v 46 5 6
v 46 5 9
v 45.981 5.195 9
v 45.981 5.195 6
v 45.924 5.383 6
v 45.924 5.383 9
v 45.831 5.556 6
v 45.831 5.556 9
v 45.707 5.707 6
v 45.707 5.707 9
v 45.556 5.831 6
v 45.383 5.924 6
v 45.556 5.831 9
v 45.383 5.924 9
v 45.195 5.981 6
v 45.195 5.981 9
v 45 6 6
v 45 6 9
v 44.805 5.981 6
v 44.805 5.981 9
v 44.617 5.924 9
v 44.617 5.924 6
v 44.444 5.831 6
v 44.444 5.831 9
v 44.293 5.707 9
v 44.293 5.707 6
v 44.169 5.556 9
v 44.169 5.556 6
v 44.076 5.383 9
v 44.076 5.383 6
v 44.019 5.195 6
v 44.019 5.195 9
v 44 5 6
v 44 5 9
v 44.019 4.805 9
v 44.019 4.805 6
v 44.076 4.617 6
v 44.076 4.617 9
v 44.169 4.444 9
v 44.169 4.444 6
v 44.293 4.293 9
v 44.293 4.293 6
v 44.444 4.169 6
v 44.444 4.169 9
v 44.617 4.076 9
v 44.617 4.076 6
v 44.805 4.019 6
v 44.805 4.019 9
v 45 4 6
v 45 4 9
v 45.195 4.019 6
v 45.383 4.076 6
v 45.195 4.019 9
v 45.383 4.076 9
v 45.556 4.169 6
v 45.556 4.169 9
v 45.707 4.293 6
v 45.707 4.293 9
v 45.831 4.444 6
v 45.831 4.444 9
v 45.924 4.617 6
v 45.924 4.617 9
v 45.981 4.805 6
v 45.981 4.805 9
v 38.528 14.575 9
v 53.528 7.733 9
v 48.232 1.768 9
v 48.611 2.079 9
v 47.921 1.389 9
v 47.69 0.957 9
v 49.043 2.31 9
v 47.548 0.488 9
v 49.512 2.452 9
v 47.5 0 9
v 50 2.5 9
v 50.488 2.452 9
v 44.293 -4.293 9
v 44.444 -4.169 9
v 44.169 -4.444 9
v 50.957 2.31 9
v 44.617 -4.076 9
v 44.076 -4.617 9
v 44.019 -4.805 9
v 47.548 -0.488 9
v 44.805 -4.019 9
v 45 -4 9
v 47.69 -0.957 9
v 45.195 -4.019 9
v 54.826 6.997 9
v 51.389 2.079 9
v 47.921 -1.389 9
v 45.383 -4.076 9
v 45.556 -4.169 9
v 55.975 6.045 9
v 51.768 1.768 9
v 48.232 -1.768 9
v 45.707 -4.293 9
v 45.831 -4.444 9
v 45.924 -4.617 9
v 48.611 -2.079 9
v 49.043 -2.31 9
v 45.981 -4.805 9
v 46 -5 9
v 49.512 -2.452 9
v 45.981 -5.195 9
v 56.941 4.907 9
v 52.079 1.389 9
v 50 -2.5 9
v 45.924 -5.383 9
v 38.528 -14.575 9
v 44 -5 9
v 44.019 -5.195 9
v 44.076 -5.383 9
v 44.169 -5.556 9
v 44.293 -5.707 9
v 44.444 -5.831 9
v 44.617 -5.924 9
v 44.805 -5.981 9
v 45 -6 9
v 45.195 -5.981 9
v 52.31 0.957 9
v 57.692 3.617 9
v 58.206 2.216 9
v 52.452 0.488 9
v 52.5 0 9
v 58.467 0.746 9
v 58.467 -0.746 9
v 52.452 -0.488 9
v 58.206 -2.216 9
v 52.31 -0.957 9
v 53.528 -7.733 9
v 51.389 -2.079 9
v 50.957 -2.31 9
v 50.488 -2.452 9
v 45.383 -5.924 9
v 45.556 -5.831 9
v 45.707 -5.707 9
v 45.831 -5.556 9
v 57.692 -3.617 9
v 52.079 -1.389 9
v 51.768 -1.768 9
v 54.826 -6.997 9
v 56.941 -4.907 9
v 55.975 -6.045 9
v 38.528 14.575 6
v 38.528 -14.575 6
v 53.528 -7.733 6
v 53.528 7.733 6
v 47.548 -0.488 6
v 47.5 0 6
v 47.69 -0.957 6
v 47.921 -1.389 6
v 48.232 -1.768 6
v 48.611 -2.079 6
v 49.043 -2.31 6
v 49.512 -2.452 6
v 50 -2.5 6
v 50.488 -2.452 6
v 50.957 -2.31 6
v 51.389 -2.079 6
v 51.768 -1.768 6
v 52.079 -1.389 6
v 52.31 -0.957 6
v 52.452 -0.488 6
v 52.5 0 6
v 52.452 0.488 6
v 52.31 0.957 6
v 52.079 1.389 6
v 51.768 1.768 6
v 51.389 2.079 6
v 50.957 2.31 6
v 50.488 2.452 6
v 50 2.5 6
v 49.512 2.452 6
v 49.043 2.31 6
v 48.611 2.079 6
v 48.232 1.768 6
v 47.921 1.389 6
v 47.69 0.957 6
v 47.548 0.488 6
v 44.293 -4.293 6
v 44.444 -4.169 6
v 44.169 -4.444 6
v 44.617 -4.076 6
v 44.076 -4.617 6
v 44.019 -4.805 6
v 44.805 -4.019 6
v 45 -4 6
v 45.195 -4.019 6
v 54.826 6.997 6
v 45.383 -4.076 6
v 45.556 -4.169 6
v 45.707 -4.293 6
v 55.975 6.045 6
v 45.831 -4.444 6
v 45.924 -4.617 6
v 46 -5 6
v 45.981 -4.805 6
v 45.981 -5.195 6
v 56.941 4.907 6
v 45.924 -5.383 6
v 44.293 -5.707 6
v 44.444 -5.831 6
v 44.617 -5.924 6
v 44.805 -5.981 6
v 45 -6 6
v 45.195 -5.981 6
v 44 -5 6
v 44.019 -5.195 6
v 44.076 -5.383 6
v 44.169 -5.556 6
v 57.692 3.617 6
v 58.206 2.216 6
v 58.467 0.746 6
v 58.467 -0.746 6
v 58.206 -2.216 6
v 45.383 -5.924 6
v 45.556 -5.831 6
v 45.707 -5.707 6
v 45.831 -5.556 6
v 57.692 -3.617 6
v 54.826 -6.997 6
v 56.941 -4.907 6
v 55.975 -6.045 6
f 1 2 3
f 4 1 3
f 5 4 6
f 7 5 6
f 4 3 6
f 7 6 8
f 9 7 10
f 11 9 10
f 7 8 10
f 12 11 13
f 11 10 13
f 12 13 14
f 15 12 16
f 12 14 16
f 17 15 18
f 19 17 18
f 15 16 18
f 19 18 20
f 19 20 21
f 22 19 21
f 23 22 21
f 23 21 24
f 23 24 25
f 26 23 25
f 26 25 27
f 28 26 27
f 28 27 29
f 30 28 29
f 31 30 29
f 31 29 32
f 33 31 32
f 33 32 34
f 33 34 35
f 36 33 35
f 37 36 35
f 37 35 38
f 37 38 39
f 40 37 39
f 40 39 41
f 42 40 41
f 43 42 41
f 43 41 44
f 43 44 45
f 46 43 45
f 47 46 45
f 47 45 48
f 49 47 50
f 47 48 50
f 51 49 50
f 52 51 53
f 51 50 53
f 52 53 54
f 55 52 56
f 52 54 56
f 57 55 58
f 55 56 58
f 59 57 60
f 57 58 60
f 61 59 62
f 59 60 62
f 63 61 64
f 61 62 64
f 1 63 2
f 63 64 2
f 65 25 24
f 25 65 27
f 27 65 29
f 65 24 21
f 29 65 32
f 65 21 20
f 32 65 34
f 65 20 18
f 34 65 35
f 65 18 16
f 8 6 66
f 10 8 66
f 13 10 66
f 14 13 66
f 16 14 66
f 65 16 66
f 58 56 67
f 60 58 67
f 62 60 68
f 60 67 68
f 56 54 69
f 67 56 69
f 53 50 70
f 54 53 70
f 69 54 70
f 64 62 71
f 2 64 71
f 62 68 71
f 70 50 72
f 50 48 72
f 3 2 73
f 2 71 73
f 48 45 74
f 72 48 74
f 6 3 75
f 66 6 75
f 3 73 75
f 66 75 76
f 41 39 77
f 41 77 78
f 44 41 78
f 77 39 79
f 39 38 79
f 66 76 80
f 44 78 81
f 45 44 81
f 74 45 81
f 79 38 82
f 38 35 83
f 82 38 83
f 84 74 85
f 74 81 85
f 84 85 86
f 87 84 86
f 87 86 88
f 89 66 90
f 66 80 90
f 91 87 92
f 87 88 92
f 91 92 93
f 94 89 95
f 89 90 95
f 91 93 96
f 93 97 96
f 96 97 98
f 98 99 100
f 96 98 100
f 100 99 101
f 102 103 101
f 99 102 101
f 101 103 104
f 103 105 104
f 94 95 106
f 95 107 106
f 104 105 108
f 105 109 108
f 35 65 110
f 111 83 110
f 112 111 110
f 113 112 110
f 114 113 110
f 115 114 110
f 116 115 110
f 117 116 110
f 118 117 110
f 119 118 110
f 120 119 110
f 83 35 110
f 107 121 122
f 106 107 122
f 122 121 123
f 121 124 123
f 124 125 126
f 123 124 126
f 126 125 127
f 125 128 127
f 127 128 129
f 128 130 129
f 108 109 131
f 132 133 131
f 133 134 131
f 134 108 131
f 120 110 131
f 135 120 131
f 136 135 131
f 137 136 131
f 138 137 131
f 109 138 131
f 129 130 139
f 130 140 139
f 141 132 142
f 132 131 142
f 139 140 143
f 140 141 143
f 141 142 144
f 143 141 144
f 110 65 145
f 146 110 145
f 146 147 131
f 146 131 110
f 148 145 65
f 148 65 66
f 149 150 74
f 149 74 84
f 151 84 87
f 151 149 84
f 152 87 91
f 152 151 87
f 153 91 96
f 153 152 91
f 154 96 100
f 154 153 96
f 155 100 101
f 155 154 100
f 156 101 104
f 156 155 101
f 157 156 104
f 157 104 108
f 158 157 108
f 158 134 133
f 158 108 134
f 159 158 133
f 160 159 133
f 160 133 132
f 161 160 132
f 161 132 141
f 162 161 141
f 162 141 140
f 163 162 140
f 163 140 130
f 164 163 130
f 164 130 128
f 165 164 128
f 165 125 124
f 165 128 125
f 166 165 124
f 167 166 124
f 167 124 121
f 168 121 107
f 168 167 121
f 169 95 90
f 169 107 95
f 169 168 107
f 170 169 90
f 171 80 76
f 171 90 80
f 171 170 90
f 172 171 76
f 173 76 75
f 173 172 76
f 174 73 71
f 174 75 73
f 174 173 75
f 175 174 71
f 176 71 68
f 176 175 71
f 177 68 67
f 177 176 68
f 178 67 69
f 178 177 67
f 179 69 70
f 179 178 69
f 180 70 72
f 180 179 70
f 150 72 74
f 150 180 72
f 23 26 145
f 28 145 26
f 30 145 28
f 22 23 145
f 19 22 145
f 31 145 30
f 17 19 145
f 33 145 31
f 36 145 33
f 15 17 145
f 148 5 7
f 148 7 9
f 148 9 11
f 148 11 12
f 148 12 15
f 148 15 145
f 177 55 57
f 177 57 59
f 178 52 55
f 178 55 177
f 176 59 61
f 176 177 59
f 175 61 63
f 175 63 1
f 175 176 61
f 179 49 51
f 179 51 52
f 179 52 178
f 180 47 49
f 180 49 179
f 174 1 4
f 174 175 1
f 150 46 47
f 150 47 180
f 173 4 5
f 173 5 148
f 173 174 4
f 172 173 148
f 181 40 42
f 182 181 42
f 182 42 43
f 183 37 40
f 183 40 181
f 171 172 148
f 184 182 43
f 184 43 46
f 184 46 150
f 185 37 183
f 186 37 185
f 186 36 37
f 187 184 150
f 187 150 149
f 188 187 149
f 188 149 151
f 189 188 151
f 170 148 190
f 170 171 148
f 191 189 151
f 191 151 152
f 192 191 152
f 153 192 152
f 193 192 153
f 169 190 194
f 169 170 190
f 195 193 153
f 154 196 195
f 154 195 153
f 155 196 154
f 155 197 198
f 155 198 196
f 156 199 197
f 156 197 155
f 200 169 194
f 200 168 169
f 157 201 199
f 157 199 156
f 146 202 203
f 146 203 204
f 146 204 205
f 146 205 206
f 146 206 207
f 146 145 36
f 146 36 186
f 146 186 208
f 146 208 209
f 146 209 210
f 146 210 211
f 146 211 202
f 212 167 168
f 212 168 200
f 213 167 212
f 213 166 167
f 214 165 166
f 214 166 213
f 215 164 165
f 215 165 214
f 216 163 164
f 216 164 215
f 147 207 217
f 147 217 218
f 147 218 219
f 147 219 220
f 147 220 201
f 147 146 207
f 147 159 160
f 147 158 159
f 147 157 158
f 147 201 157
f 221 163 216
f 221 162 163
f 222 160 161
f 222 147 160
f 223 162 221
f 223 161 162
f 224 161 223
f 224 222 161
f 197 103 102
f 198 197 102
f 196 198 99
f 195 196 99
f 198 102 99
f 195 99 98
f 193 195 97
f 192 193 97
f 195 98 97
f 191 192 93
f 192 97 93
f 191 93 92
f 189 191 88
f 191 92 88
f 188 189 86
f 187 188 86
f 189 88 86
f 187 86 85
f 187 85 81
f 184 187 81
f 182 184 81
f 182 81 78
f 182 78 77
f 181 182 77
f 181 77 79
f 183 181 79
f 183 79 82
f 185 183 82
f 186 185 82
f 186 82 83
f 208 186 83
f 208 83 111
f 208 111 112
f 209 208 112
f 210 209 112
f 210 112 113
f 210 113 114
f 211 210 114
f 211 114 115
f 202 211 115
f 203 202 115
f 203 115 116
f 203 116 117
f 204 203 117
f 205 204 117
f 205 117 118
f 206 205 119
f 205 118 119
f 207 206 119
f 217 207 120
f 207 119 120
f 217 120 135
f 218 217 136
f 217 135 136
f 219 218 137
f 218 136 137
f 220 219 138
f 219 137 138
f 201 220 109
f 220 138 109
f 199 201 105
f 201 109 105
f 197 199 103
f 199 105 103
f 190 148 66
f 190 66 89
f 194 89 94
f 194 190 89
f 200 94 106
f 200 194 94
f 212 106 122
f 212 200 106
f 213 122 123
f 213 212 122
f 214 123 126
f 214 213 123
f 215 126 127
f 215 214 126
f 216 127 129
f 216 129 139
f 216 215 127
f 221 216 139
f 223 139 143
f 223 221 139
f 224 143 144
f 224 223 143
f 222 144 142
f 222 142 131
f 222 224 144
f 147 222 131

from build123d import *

# Parameters (mm, degrees)
ESQUISSE1_R                  = 19.25
ESQUISSE1_R_2                = 2.5
BOSS_EXTRU_1_DEPTH           = 42
ENL_V_MAT_EXTRU_1_DEPTH      = 74.881298321
ENL_V_MAT_EXTRU_1_DEPTH_BACK = 74.881298321
ESQUISSE2_W                  = 90
ESQUISSE2_H                  = 30
ESQUISSE3_R                  = 1
ENL_V_MAT_EXTRU_2_DEPTH      = 42
ENL_V_MAT_EXTRU_3_DEPTH      = 78.729096869
ENL_V_MAT_EXTRU_3_DEPTH_BACK = 78.729096869
ESQUISSE4_W                  = 87.75
ESQUISSE4_H                  = 33
ESQUISSE4_H_2                = 6


with BuildPart() as part:
    # Esquisse1 → Boss.-Extru.1 (new body)
    with BuildSketch(Plane.XY):
        with BuildLine():
            Line((12.13875, 26.612276273), (53.5275, 7.733481994))
            ThreePointArc((53.5275, 7.733481994), (58.5, 0), (53.5275, -7.733481994))
            Line((53.5275, -7.733481994), (12.13875, -26.612276273))
            ThreePointArc((12.13875, -26.612276273), (-29.25, 0), (12.13875, 26.612276273))
        make_face()
        with Locations(Location((0, 0, 0), (0, 0, 180))):
            Circle(ESQUISSE1_R, mode=Mode.SUBTRACT)
        with Locations(Location((50, 0, 0), (0, 0, 180))):
            Circle(ESQUISSE1_R_2, mode=Mode.SUBTRACT)
    extrude(amount=BOSS_EXTRU_1_DEPTH)

    # Esquisse2 → Enlèv. mat.-Extru.1 (cut, two sides: drawn at the far end of the back side and taken through both)
    with BuildSketch(Plane(origin=(5.218823759, 0, 0), x_dir=(1, 0, 0), z_dir=(0, 1, 0)).offset(-ENL_V_MAT_EXTRU_1_DEPTH_BACK)):
        with Locations((-11.691323759, -21)):
            Rectangle(ESQUISSE2_W, ESQUISSE2_H)
    extrude(amount=ENL_V_MAT_EXTRU_1_DEPTH + ENL_V_MAT_EXTRU_1_DEPTH_BACK, mode=Mode.SUBTRACT)

    # Esquisse3 → Enlèv. mat.-Extru.2 (cut)
    with BuildSketch(Plane.XY.offset(42)):
        with Locations((45, 5)):
            Circle(ESQUISSE3_R)
        with Locations((45, -5)):
            Circle(ESQUISSE3_R)
        with Locations((-15, 19)):
            Circle(ESQUISSE3_R)
        with Locations((-15, -19)):
            Circle(ESQUISSE3_R)
    extrude(amount=-ENL_V_MAT_EXTRU_2_DEPTH, mode=Mode.SUBTRACT)

    # Esquisse4 → Enlèv. mat.-Extru.3 (cut, two sides: drawn at the far end of the back side and taken through both)
    with BuildSketch(Plane(origin=(0, 0, 0), x_dir=(1, 0, 0), z_dir=(0, 1, 0)).offset(-ENL_V_MAT_EXTRU_3_DEPTH_BACK)):
        with Locations((14.625, -25.5)):
            Rectangle(ESQUISSE4_W, ESQUISSE4_H)
        with Locations((14.625, -3)):
            Rectangle(ESQUISSE4_W, ESQUISSE4_H_2)
    extrude(amount=ENL_V_MAT_EXTRU_3_DEPTH + ENL_V_MAT_EXTRU_3_DEPTH_BACK, mode=Mode.SUBTRACT)


solid = part.part
